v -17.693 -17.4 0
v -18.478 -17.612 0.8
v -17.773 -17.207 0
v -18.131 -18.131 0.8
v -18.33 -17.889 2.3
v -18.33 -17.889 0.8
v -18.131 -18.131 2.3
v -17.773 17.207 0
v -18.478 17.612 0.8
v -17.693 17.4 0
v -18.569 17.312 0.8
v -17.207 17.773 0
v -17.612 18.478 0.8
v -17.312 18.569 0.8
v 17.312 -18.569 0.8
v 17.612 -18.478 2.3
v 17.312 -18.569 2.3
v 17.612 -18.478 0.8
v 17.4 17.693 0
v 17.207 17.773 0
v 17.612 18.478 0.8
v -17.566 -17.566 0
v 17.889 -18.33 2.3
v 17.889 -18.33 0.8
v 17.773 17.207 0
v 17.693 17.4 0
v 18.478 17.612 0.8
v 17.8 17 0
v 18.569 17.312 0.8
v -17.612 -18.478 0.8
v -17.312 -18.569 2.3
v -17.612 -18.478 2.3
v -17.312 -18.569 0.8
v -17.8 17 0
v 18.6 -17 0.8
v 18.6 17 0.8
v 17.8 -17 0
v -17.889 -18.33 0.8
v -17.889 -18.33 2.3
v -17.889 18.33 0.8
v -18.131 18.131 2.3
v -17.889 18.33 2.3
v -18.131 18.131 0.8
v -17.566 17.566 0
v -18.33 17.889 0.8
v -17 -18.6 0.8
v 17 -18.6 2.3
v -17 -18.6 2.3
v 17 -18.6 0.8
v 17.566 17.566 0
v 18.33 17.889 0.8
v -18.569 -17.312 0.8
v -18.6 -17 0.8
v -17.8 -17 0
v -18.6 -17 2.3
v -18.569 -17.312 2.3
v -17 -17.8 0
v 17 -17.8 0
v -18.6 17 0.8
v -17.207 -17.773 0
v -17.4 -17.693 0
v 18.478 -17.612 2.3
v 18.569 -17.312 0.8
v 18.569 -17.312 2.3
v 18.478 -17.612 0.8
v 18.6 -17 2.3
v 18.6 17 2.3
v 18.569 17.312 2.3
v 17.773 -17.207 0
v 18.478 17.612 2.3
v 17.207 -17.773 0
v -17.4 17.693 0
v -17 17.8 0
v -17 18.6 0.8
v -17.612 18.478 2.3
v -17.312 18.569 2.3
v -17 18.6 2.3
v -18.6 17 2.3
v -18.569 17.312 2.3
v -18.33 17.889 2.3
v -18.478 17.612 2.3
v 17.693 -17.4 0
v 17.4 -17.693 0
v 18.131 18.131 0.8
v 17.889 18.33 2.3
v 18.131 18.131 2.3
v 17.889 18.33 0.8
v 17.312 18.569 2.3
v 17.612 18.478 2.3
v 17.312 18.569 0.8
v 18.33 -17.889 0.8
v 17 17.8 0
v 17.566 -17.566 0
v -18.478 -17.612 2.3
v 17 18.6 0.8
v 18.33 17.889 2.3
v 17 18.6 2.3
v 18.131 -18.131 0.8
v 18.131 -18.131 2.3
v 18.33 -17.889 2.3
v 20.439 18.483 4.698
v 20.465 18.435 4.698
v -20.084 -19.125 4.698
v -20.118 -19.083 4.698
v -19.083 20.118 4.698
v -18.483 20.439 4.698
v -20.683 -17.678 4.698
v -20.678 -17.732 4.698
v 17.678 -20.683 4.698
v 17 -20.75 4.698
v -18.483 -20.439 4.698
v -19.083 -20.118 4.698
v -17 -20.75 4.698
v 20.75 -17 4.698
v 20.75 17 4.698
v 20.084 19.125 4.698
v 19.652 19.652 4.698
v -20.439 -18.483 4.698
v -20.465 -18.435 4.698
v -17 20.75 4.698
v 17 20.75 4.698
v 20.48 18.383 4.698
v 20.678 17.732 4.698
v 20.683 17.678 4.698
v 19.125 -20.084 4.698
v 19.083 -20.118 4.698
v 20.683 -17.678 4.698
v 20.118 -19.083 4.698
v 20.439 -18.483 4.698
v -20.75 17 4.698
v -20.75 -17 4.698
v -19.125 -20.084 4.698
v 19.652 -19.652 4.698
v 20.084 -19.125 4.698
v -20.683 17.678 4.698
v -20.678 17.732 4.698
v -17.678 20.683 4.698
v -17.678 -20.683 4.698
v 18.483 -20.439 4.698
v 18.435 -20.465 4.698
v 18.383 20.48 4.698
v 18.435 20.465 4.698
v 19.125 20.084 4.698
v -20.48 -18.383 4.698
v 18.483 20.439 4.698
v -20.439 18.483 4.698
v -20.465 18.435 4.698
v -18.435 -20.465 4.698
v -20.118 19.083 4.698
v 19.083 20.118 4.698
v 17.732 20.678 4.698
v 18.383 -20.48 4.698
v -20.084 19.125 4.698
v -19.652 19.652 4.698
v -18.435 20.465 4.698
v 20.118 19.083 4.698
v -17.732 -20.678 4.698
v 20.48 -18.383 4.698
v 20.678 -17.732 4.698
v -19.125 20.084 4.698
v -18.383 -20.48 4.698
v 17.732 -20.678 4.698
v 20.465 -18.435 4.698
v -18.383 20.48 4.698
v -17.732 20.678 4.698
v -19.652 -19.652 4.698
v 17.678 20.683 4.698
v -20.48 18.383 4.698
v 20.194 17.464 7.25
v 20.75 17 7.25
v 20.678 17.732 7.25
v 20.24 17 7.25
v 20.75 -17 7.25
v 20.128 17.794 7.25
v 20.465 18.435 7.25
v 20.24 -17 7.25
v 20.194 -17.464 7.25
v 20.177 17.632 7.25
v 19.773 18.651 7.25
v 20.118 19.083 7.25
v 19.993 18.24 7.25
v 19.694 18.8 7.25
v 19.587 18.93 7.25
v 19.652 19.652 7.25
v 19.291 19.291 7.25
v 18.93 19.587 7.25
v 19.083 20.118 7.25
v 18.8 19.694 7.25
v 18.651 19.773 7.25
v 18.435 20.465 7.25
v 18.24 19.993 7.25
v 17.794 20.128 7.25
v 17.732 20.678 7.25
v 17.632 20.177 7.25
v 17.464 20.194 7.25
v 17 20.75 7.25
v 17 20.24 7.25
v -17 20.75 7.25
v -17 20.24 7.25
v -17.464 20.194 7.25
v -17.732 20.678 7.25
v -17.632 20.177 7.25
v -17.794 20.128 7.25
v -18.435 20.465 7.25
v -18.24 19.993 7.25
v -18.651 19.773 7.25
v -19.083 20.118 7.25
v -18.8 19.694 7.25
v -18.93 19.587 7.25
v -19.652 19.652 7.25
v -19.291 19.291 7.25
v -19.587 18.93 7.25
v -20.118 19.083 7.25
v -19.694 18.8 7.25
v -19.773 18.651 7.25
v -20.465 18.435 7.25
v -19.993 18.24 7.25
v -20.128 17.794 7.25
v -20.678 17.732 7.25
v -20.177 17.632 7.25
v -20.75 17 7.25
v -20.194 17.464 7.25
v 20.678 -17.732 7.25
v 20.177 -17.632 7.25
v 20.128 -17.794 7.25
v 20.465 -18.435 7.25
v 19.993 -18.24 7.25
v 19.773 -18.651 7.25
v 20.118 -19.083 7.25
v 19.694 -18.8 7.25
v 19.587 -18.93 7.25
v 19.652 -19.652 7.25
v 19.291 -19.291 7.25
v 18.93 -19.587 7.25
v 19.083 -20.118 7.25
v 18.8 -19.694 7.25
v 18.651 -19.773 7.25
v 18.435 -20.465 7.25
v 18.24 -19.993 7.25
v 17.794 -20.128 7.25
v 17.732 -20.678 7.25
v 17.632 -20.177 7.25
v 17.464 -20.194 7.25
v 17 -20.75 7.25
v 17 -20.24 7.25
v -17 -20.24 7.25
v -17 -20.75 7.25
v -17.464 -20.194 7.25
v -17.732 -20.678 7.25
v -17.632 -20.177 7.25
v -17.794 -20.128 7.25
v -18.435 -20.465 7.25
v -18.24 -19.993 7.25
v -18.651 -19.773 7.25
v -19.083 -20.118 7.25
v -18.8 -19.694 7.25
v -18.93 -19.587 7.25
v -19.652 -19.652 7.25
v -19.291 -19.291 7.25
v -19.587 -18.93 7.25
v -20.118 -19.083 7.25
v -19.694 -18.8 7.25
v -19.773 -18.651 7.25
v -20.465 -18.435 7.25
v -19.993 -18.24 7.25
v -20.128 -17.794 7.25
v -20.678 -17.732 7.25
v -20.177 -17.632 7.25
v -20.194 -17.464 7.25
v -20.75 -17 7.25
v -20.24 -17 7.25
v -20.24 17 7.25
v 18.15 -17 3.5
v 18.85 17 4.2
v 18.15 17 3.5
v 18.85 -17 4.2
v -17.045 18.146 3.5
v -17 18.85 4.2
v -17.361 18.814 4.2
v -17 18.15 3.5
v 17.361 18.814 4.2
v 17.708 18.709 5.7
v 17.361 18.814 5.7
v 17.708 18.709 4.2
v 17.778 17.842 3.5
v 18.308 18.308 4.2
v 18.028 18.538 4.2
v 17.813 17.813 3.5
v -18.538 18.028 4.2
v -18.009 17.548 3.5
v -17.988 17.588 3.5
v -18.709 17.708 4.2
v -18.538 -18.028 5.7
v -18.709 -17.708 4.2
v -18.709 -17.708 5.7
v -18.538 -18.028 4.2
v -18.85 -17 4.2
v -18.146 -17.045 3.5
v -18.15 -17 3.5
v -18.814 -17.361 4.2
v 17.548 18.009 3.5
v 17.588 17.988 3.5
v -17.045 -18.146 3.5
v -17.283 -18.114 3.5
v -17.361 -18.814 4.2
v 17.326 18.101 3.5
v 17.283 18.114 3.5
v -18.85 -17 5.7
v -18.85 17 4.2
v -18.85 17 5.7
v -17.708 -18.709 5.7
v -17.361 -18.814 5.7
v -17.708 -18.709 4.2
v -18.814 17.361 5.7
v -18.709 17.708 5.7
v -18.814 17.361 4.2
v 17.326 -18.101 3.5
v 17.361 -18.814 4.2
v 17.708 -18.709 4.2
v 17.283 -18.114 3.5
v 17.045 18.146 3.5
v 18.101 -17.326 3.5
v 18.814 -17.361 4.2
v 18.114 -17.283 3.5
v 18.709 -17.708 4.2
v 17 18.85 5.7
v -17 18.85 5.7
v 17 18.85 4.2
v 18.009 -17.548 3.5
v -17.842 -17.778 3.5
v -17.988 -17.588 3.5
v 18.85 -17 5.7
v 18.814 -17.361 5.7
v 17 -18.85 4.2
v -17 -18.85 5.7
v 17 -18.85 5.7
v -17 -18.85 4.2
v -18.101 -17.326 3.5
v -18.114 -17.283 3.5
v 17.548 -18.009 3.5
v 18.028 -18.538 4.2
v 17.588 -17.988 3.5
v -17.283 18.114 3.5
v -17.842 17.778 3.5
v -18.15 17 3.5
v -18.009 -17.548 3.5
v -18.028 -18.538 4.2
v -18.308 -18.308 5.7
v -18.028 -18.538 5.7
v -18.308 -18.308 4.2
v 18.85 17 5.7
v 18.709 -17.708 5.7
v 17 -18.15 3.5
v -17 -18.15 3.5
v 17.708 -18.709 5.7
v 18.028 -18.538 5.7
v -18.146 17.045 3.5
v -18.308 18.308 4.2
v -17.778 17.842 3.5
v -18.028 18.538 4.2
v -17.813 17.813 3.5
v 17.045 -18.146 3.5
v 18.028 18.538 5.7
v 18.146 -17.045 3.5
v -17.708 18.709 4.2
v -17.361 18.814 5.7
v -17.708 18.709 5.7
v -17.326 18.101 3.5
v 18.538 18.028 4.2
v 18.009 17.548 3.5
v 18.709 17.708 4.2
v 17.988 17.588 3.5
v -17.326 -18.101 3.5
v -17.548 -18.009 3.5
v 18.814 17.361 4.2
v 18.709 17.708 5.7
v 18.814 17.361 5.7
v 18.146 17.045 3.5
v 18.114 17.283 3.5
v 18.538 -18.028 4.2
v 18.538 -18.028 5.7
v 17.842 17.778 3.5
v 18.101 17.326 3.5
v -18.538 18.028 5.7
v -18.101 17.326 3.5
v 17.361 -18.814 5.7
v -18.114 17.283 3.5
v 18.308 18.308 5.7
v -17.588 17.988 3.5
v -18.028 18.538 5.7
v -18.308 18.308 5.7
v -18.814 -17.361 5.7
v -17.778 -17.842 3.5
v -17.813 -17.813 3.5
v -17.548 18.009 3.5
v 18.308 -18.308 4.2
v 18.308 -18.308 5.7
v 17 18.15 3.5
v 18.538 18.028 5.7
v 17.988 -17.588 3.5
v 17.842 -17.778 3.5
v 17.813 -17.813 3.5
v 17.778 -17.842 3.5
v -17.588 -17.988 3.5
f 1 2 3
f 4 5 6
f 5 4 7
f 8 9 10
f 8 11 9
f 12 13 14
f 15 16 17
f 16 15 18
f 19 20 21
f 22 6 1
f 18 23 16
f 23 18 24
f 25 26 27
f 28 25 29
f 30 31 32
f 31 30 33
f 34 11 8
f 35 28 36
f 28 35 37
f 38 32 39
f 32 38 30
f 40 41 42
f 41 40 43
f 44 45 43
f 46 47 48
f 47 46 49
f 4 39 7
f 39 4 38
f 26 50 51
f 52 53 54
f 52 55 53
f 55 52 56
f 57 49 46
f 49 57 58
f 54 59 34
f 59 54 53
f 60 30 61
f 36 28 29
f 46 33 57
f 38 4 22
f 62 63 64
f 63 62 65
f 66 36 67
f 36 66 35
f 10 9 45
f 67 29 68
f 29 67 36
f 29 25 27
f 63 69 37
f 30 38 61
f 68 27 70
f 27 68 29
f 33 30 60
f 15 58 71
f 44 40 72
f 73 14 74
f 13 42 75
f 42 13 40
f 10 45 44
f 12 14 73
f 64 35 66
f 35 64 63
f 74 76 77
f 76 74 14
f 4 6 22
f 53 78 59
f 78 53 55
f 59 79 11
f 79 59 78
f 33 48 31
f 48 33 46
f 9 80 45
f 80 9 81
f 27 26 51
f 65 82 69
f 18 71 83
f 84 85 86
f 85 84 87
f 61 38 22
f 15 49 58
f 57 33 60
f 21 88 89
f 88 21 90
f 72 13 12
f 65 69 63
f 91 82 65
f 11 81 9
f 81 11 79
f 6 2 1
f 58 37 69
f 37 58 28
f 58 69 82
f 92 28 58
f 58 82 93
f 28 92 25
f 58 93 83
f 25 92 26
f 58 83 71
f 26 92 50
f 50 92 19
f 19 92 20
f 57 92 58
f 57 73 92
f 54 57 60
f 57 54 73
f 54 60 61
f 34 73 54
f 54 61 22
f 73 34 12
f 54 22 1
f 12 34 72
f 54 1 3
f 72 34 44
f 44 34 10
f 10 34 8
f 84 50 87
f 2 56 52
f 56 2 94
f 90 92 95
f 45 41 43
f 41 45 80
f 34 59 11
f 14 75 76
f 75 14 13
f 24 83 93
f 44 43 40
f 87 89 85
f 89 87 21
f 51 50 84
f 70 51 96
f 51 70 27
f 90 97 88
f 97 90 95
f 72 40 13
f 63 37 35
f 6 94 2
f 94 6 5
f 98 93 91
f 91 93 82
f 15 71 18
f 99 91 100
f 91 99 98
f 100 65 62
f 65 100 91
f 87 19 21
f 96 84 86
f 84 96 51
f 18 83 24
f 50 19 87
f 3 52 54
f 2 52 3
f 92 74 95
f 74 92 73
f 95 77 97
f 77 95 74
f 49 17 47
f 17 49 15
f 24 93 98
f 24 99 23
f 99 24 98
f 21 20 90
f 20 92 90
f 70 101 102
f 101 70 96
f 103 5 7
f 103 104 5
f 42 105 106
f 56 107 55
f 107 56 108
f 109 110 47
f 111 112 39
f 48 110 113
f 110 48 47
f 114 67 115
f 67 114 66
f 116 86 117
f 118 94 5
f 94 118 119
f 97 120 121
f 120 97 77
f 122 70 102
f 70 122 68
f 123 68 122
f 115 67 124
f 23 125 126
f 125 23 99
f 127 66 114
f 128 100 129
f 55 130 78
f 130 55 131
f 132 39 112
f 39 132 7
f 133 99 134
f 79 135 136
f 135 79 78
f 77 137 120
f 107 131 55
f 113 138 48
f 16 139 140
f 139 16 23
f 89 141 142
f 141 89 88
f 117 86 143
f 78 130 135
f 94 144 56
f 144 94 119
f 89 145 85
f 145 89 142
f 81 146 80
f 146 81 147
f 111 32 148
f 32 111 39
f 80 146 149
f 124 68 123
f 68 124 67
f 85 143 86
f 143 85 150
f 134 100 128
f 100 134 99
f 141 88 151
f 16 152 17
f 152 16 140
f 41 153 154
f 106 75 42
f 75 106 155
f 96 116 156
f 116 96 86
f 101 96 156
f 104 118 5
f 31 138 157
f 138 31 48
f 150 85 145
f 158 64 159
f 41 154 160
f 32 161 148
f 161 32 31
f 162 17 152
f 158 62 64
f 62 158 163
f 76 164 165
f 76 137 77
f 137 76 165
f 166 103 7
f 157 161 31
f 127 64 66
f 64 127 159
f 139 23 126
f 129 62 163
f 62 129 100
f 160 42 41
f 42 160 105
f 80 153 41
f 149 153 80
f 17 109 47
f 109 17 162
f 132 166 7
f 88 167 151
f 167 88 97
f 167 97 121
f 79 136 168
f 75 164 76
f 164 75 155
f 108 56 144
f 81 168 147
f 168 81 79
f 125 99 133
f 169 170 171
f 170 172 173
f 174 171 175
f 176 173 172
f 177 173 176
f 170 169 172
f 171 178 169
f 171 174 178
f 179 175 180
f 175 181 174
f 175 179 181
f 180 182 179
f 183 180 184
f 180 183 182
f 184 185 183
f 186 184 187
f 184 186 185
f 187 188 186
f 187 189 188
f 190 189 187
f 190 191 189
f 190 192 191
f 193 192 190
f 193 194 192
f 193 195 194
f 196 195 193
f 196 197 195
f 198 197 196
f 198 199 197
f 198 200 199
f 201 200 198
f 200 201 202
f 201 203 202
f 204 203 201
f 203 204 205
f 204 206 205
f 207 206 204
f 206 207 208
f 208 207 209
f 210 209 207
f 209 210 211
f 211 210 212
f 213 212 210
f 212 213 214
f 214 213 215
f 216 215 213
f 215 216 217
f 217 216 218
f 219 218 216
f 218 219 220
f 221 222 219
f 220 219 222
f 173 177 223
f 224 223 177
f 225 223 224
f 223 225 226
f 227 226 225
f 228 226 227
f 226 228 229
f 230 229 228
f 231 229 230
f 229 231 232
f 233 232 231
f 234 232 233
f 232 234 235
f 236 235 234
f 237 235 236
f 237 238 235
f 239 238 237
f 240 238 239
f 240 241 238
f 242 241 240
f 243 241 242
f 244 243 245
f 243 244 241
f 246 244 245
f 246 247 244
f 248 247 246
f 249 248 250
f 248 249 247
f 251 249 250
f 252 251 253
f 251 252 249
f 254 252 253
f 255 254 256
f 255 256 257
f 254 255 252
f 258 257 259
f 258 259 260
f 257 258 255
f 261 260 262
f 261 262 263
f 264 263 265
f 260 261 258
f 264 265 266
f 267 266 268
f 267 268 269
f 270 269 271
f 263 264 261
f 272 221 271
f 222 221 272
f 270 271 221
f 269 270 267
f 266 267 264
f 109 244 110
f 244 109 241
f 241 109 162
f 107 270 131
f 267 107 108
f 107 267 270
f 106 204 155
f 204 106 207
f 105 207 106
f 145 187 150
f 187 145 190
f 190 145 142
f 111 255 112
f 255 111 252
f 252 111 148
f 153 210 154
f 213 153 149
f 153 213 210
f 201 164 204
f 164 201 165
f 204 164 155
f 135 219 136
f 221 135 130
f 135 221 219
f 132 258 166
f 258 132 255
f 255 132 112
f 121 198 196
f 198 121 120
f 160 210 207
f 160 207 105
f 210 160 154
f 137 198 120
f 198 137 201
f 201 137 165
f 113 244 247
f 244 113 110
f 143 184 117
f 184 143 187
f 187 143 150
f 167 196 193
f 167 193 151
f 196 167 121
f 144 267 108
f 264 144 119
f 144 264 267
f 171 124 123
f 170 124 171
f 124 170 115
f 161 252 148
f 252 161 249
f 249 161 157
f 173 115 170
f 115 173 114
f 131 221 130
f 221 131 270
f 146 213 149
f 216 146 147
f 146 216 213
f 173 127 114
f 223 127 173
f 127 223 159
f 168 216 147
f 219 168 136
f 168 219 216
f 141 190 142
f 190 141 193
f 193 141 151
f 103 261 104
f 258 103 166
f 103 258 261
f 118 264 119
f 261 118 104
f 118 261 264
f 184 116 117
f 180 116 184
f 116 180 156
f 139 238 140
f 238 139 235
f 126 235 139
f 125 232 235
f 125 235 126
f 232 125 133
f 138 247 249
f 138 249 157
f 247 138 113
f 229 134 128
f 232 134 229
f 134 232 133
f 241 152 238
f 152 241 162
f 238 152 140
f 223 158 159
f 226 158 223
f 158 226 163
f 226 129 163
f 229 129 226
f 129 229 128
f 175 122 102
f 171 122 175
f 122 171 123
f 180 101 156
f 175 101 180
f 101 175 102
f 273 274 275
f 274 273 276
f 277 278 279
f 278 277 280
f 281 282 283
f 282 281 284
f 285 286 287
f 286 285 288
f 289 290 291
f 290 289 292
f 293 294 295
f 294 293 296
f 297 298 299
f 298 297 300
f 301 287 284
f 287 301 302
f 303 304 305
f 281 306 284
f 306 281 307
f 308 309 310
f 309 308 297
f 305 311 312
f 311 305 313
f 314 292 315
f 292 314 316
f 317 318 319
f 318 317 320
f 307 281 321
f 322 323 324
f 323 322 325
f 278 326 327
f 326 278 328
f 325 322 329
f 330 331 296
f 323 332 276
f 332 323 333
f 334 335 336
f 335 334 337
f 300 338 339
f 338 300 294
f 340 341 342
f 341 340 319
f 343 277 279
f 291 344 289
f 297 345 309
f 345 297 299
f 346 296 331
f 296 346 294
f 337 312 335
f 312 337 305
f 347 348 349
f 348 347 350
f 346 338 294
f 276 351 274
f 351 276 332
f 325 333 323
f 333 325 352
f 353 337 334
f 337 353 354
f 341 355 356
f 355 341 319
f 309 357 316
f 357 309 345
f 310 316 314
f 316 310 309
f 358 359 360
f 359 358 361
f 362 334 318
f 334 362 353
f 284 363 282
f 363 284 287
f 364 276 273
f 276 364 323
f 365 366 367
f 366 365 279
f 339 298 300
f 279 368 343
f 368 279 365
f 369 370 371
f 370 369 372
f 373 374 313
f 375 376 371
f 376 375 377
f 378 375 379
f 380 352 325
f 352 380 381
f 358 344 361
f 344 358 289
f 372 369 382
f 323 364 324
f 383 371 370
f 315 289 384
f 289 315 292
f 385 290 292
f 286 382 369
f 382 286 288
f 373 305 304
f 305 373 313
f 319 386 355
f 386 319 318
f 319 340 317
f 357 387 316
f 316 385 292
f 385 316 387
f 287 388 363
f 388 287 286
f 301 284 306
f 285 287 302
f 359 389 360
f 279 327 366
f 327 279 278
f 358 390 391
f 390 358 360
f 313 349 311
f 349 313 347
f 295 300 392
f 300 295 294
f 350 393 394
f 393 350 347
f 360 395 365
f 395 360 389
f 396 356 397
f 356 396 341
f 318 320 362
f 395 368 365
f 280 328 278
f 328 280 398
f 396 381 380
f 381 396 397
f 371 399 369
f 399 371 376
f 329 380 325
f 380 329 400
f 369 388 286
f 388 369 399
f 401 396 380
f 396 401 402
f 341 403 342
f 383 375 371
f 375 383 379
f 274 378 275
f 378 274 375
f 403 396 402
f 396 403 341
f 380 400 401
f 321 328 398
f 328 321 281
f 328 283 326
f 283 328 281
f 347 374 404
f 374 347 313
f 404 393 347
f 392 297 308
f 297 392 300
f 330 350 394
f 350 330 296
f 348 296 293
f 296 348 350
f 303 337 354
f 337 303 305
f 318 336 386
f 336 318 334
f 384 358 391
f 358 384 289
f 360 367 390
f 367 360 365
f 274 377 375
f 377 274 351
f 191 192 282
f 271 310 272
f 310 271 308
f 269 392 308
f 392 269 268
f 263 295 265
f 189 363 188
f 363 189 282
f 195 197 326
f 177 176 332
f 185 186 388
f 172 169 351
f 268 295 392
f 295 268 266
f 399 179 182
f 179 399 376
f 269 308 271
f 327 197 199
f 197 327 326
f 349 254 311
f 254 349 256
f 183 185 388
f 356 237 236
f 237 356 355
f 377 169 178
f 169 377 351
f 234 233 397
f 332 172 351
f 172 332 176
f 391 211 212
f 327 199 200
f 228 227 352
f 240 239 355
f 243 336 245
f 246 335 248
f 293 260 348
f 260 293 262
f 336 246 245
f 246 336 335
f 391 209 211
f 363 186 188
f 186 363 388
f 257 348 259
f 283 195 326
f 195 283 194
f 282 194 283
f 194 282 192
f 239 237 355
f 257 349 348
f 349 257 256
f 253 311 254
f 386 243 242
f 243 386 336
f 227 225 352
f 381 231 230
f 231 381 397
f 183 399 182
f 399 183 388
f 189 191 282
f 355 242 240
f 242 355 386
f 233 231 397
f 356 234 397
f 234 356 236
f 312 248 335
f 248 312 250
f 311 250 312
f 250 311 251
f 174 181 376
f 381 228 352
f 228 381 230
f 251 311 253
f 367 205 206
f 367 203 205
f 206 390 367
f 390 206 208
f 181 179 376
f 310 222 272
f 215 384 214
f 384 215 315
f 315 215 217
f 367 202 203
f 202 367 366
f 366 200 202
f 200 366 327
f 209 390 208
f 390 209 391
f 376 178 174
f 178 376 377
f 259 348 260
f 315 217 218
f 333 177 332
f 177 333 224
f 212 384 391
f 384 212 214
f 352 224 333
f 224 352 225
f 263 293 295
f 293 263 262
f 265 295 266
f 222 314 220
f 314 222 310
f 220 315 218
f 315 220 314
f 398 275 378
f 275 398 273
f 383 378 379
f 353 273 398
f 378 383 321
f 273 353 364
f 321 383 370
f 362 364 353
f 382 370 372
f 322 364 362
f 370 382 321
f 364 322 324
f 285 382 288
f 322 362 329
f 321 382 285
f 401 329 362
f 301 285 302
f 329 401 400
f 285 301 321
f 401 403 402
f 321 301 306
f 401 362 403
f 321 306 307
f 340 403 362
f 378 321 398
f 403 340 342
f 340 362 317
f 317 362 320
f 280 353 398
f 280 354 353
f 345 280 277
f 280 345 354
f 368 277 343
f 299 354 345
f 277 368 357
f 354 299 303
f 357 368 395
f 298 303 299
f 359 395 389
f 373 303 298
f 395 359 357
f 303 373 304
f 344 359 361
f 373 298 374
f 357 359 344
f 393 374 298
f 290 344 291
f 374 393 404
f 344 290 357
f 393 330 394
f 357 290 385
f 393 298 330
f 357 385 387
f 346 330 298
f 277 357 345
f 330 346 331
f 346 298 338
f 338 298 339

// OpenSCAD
include <gridfinity_modules.scad>

grid_block(num_x=1, num_y=1, num_z=0.5, magnet_diameter=0, screw_depth=0);
